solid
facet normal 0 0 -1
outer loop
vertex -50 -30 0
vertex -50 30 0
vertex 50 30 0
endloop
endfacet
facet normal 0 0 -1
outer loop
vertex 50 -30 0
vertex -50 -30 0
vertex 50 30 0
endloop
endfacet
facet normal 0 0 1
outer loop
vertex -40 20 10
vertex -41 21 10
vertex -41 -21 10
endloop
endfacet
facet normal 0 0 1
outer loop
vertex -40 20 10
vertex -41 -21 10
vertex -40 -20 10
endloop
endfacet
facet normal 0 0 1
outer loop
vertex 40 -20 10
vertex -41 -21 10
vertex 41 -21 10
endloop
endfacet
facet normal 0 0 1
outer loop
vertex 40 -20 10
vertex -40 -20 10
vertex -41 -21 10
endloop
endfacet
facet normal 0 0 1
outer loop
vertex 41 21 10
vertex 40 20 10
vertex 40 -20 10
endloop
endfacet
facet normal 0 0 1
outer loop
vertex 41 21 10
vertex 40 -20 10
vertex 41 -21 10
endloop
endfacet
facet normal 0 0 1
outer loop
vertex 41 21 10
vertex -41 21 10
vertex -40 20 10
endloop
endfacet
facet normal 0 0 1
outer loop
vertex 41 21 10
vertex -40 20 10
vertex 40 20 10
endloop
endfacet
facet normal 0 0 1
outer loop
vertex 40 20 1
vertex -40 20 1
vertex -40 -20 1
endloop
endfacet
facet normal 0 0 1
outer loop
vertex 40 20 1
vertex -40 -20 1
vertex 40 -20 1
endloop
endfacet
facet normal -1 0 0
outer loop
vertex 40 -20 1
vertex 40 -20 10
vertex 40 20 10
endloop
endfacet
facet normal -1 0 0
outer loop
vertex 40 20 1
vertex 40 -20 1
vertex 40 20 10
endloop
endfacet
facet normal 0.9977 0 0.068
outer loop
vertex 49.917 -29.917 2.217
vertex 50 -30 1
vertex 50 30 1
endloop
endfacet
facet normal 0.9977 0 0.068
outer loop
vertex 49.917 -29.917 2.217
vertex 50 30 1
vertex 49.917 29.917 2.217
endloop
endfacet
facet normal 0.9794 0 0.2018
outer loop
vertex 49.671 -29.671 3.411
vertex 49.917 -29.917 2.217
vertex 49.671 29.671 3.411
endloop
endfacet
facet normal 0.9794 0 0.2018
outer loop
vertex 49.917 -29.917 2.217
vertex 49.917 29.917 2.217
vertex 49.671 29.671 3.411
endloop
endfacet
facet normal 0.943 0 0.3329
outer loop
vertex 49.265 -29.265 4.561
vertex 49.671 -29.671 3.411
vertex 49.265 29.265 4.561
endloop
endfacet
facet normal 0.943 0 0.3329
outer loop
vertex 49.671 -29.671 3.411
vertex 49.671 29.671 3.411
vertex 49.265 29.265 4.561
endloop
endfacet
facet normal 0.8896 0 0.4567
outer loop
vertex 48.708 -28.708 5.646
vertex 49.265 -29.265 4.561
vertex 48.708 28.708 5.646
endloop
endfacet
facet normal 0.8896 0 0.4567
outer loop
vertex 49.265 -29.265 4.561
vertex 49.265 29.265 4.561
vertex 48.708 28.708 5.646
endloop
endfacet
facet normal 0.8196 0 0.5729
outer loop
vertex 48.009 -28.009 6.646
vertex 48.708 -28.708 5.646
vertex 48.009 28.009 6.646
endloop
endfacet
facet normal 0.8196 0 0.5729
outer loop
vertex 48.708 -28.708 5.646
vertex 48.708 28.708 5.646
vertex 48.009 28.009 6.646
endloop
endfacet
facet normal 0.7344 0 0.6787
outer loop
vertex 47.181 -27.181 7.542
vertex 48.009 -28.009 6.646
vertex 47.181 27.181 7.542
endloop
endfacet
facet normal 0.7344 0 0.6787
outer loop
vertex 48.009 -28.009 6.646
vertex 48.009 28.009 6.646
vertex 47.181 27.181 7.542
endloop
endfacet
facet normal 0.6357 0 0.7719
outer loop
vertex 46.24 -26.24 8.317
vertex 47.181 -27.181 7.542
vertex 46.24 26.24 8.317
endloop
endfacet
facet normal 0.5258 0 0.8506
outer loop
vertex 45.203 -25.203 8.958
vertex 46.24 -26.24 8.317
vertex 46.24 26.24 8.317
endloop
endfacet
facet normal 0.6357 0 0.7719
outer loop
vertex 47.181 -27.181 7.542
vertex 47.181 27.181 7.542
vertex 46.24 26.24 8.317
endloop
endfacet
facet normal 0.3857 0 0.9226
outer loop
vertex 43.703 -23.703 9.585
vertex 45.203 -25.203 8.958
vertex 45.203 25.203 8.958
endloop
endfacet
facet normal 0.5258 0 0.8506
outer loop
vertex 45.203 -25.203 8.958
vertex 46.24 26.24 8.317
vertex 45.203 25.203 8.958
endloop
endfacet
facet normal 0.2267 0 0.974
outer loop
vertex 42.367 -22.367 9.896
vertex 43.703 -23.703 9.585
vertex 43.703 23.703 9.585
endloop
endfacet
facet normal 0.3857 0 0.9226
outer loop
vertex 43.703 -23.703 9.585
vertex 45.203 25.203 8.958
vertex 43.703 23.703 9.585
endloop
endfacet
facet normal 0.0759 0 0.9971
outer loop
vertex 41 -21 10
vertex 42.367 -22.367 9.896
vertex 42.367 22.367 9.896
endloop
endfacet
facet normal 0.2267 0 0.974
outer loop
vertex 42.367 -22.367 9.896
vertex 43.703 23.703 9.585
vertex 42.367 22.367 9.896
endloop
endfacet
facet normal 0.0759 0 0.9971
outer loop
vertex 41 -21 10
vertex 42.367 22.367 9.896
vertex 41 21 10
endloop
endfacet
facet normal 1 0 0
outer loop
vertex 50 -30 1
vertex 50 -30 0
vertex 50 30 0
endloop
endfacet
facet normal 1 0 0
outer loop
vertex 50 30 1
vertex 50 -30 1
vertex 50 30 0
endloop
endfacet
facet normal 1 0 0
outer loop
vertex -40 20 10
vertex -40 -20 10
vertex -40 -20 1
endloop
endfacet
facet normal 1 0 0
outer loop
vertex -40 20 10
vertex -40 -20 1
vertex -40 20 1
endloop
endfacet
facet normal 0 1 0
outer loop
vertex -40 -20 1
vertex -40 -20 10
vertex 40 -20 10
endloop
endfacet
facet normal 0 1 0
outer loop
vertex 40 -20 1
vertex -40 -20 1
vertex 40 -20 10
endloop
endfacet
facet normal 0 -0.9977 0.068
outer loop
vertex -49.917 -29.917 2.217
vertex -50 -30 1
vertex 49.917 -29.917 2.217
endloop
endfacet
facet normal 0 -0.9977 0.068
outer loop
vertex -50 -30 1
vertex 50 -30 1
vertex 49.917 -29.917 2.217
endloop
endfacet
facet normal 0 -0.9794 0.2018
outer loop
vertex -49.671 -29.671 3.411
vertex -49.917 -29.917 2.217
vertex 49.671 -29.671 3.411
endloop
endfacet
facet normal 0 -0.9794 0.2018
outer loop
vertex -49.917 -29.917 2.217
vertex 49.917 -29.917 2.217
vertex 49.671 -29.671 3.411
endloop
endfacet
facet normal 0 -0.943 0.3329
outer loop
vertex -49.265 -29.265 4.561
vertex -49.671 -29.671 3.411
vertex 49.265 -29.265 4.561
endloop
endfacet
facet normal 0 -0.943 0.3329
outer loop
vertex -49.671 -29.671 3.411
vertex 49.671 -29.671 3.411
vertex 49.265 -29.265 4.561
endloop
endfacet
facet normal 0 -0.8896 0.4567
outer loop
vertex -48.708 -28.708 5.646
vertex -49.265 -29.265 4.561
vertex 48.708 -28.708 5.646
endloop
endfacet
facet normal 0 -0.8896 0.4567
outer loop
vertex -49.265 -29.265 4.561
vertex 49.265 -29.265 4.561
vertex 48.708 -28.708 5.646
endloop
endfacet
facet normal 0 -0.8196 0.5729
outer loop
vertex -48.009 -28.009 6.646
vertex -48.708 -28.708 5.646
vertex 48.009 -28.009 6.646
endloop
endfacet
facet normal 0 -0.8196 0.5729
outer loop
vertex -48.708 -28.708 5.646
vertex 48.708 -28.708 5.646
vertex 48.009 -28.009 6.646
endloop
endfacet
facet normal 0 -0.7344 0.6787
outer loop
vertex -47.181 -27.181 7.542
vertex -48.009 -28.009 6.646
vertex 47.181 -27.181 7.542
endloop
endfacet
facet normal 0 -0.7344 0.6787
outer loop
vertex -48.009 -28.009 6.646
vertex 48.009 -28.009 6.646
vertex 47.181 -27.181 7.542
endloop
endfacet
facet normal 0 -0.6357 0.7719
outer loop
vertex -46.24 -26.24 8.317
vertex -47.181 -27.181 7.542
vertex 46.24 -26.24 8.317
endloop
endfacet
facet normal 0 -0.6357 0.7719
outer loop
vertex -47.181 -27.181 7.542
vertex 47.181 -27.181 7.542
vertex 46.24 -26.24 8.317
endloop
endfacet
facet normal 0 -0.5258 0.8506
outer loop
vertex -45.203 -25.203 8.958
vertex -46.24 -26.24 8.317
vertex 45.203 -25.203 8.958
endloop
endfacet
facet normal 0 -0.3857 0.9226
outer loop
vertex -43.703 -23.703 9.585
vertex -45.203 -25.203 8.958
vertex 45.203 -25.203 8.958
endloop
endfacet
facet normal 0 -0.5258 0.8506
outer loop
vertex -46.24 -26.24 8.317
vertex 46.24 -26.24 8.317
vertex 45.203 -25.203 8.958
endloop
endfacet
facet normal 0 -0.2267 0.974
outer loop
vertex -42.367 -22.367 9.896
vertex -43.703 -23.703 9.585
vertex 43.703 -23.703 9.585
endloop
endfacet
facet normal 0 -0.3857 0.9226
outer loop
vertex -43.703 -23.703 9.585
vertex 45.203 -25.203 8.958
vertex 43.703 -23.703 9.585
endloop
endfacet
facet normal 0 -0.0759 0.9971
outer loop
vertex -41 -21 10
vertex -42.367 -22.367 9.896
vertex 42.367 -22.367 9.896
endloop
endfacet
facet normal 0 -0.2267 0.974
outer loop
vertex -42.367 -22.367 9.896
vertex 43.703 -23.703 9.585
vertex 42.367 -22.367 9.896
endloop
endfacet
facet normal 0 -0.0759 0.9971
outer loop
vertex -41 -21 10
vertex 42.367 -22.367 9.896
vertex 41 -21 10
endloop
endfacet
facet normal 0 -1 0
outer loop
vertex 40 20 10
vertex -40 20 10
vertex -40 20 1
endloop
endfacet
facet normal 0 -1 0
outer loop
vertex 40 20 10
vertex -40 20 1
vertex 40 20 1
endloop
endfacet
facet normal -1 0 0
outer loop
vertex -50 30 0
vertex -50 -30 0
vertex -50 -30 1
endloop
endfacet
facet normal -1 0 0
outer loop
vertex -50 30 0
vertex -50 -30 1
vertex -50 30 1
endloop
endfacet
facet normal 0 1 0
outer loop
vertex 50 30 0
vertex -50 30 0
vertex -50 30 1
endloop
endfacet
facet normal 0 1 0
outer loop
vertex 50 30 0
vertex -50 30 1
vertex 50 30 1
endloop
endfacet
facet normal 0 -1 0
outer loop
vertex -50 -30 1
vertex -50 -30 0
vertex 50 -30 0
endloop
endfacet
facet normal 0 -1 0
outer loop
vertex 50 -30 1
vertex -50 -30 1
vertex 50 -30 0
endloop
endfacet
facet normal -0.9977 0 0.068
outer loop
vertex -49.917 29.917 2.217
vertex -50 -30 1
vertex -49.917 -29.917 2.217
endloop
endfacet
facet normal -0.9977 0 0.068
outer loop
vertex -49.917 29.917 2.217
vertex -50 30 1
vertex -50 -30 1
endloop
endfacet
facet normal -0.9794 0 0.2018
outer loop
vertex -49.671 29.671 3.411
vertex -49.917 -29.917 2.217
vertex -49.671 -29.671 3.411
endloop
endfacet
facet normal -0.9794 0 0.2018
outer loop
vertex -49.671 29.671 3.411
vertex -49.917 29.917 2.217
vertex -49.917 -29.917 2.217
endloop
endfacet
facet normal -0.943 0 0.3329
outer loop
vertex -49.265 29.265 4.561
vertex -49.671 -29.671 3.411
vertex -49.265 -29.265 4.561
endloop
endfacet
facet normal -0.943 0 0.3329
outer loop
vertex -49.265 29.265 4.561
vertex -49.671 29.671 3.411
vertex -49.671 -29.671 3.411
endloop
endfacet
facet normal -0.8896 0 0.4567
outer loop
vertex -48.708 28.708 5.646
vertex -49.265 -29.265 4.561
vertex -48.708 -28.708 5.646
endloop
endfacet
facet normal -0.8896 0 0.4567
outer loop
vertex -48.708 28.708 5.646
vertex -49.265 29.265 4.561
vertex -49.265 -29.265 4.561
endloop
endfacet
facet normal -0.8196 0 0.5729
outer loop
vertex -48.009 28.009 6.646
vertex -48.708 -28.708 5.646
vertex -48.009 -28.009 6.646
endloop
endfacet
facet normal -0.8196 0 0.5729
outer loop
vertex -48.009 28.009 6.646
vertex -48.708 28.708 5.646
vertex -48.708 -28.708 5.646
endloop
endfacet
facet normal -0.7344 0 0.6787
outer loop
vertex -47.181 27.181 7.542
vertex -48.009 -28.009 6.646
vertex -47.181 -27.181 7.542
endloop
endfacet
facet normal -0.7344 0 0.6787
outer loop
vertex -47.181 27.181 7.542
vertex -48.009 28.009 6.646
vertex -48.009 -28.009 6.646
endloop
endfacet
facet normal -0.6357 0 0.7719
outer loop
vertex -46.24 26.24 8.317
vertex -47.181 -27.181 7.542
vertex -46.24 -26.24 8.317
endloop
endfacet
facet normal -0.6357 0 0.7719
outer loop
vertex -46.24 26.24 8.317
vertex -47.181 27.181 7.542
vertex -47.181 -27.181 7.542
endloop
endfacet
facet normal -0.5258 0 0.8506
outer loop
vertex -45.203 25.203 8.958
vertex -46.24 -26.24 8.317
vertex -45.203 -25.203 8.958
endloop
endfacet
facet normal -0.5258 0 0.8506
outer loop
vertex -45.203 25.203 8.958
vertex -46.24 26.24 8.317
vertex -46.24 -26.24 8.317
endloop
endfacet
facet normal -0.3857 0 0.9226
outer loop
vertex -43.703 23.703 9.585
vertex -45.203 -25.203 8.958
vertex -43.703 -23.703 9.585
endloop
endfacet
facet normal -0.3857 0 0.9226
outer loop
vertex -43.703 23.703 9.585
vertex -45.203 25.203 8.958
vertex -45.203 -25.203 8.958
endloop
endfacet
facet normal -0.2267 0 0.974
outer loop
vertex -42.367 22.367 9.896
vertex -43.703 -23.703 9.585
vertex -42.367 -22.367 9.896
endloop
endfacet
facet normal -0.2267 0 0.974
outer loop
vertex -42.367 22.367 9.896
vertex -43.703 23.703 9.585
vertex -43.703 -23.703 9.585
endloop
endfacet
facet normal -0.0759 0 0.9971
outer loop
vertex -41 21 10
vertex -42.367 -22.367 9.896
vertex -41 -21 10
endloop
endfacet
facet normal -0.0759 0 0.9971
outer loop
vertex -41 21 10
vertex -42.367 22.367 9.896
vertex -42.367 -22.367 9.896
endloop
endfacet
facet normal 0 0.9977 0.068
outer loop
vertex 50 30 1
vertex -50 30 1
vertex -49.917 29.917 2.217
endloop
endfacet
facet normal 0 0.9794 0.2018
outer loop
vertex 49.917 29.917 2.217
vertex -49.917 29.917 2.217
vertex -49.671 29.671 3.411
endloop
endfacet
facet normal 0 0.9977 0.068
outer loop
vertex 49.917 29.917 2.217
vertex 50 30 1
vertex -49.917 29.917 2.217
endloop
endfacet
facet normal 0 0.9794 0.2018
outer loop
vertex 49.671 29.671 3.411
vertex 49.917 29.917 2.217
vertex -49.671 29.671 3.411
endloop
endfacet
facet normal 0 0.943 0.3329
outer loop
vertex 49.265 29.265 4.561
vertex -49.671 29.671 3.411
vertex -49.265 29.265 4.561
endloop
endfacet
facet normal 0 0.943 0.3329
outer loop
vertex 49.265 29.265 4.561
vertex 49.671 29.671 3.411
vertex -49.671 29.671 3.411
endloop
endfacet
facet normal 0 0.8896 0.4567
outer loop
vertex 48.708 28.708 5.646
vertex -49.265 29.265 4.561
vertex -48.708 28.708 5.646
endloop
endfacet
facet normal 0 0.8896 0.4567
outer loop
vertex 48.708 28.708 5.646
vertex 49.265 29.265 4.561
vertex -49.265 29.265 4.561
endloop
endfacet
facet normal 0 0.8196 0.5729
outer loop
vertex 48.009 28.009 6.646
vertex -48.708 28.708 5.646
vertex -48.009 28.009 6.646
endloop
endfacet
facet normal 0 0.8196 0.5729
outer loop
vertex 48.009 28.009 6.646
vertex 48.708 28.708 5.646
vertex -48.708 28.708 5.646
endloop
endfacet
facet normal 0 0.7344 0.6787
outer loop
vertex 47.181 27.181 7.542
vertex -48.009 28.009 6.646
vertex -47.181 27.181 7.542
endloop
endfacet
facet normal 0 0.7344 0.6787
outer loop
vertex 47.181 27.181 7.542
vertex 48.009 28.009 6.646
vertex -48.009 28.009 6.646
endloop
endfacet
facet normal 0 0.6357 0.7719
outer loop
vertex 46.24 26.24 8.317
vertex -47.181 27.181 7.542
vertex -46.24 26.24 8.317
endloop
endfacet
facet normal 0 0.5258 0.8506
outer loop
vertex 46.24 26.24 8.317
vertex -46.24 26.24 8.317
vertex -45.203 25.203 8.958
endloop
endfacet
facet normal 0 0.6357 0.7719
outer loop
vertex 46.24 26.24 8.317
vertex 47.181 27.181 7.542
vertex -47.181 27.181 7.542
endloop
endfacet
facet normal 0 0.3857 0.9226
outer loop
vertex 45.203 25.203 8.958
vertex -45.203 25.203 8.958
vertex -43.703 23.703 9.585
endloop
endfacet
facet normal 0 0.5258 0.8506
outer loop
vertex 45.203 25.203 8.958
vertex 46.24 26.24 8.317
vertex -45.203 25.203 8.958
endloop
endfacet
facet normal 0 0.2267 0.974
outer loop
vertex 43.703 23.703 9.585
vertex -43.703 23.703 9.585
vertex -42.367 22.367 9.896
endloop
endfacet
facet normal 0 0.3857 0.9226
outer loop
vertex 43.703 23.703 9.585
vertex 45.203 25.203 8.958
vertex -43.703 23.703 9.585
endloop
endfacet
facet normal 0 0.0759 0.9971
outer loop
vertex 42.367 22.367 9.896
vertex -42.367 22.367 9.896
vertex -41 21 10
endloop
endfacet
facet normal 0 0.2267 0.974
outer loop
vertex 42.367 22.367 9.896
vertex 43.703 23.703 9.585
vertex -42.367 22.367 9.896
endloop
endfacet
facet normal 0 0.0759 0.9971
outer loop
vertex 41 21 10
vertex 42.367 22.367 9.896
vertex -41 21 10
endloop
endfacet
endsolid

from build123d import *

# Parameters (mm, degrees)
SKETCH_W     = 100
SKETCH_H     = 60
PAD_DEPTH    = 10
FILLET_R     = 9
SKETCH001_W  = 80
SKETCH001_H  = 40
POCKET_DEPTH = 9


with BuildPart() as part:
    # Sketch → Pad (new body)
    with BuildSketch(Plane.XY):
        Rectangle(SKETCH_W, SKETCH_H)
    extrude(amount=PAD_DEPTH)

    # Fillet
    fillet_edges = [part.edges().sort_by_distance(p)[0] for p in [
        (0, -30, 10),
        (50, 0, 10),
        (0, 30, 10),
        (-50, 0, 10),
    ]]
    fillet(fillet_edges, radius=FILLET_R)

    # Sketch001 → Pocket (cut)
    with BuildSketch(Plane.XY.offset(10)):
        Rectangle(SKETCH001_W, SKETCH001_H)
    extrude(amount=-POCKET_DEPTH, mode=Mode.SUBTRACT)


solid = part.part
